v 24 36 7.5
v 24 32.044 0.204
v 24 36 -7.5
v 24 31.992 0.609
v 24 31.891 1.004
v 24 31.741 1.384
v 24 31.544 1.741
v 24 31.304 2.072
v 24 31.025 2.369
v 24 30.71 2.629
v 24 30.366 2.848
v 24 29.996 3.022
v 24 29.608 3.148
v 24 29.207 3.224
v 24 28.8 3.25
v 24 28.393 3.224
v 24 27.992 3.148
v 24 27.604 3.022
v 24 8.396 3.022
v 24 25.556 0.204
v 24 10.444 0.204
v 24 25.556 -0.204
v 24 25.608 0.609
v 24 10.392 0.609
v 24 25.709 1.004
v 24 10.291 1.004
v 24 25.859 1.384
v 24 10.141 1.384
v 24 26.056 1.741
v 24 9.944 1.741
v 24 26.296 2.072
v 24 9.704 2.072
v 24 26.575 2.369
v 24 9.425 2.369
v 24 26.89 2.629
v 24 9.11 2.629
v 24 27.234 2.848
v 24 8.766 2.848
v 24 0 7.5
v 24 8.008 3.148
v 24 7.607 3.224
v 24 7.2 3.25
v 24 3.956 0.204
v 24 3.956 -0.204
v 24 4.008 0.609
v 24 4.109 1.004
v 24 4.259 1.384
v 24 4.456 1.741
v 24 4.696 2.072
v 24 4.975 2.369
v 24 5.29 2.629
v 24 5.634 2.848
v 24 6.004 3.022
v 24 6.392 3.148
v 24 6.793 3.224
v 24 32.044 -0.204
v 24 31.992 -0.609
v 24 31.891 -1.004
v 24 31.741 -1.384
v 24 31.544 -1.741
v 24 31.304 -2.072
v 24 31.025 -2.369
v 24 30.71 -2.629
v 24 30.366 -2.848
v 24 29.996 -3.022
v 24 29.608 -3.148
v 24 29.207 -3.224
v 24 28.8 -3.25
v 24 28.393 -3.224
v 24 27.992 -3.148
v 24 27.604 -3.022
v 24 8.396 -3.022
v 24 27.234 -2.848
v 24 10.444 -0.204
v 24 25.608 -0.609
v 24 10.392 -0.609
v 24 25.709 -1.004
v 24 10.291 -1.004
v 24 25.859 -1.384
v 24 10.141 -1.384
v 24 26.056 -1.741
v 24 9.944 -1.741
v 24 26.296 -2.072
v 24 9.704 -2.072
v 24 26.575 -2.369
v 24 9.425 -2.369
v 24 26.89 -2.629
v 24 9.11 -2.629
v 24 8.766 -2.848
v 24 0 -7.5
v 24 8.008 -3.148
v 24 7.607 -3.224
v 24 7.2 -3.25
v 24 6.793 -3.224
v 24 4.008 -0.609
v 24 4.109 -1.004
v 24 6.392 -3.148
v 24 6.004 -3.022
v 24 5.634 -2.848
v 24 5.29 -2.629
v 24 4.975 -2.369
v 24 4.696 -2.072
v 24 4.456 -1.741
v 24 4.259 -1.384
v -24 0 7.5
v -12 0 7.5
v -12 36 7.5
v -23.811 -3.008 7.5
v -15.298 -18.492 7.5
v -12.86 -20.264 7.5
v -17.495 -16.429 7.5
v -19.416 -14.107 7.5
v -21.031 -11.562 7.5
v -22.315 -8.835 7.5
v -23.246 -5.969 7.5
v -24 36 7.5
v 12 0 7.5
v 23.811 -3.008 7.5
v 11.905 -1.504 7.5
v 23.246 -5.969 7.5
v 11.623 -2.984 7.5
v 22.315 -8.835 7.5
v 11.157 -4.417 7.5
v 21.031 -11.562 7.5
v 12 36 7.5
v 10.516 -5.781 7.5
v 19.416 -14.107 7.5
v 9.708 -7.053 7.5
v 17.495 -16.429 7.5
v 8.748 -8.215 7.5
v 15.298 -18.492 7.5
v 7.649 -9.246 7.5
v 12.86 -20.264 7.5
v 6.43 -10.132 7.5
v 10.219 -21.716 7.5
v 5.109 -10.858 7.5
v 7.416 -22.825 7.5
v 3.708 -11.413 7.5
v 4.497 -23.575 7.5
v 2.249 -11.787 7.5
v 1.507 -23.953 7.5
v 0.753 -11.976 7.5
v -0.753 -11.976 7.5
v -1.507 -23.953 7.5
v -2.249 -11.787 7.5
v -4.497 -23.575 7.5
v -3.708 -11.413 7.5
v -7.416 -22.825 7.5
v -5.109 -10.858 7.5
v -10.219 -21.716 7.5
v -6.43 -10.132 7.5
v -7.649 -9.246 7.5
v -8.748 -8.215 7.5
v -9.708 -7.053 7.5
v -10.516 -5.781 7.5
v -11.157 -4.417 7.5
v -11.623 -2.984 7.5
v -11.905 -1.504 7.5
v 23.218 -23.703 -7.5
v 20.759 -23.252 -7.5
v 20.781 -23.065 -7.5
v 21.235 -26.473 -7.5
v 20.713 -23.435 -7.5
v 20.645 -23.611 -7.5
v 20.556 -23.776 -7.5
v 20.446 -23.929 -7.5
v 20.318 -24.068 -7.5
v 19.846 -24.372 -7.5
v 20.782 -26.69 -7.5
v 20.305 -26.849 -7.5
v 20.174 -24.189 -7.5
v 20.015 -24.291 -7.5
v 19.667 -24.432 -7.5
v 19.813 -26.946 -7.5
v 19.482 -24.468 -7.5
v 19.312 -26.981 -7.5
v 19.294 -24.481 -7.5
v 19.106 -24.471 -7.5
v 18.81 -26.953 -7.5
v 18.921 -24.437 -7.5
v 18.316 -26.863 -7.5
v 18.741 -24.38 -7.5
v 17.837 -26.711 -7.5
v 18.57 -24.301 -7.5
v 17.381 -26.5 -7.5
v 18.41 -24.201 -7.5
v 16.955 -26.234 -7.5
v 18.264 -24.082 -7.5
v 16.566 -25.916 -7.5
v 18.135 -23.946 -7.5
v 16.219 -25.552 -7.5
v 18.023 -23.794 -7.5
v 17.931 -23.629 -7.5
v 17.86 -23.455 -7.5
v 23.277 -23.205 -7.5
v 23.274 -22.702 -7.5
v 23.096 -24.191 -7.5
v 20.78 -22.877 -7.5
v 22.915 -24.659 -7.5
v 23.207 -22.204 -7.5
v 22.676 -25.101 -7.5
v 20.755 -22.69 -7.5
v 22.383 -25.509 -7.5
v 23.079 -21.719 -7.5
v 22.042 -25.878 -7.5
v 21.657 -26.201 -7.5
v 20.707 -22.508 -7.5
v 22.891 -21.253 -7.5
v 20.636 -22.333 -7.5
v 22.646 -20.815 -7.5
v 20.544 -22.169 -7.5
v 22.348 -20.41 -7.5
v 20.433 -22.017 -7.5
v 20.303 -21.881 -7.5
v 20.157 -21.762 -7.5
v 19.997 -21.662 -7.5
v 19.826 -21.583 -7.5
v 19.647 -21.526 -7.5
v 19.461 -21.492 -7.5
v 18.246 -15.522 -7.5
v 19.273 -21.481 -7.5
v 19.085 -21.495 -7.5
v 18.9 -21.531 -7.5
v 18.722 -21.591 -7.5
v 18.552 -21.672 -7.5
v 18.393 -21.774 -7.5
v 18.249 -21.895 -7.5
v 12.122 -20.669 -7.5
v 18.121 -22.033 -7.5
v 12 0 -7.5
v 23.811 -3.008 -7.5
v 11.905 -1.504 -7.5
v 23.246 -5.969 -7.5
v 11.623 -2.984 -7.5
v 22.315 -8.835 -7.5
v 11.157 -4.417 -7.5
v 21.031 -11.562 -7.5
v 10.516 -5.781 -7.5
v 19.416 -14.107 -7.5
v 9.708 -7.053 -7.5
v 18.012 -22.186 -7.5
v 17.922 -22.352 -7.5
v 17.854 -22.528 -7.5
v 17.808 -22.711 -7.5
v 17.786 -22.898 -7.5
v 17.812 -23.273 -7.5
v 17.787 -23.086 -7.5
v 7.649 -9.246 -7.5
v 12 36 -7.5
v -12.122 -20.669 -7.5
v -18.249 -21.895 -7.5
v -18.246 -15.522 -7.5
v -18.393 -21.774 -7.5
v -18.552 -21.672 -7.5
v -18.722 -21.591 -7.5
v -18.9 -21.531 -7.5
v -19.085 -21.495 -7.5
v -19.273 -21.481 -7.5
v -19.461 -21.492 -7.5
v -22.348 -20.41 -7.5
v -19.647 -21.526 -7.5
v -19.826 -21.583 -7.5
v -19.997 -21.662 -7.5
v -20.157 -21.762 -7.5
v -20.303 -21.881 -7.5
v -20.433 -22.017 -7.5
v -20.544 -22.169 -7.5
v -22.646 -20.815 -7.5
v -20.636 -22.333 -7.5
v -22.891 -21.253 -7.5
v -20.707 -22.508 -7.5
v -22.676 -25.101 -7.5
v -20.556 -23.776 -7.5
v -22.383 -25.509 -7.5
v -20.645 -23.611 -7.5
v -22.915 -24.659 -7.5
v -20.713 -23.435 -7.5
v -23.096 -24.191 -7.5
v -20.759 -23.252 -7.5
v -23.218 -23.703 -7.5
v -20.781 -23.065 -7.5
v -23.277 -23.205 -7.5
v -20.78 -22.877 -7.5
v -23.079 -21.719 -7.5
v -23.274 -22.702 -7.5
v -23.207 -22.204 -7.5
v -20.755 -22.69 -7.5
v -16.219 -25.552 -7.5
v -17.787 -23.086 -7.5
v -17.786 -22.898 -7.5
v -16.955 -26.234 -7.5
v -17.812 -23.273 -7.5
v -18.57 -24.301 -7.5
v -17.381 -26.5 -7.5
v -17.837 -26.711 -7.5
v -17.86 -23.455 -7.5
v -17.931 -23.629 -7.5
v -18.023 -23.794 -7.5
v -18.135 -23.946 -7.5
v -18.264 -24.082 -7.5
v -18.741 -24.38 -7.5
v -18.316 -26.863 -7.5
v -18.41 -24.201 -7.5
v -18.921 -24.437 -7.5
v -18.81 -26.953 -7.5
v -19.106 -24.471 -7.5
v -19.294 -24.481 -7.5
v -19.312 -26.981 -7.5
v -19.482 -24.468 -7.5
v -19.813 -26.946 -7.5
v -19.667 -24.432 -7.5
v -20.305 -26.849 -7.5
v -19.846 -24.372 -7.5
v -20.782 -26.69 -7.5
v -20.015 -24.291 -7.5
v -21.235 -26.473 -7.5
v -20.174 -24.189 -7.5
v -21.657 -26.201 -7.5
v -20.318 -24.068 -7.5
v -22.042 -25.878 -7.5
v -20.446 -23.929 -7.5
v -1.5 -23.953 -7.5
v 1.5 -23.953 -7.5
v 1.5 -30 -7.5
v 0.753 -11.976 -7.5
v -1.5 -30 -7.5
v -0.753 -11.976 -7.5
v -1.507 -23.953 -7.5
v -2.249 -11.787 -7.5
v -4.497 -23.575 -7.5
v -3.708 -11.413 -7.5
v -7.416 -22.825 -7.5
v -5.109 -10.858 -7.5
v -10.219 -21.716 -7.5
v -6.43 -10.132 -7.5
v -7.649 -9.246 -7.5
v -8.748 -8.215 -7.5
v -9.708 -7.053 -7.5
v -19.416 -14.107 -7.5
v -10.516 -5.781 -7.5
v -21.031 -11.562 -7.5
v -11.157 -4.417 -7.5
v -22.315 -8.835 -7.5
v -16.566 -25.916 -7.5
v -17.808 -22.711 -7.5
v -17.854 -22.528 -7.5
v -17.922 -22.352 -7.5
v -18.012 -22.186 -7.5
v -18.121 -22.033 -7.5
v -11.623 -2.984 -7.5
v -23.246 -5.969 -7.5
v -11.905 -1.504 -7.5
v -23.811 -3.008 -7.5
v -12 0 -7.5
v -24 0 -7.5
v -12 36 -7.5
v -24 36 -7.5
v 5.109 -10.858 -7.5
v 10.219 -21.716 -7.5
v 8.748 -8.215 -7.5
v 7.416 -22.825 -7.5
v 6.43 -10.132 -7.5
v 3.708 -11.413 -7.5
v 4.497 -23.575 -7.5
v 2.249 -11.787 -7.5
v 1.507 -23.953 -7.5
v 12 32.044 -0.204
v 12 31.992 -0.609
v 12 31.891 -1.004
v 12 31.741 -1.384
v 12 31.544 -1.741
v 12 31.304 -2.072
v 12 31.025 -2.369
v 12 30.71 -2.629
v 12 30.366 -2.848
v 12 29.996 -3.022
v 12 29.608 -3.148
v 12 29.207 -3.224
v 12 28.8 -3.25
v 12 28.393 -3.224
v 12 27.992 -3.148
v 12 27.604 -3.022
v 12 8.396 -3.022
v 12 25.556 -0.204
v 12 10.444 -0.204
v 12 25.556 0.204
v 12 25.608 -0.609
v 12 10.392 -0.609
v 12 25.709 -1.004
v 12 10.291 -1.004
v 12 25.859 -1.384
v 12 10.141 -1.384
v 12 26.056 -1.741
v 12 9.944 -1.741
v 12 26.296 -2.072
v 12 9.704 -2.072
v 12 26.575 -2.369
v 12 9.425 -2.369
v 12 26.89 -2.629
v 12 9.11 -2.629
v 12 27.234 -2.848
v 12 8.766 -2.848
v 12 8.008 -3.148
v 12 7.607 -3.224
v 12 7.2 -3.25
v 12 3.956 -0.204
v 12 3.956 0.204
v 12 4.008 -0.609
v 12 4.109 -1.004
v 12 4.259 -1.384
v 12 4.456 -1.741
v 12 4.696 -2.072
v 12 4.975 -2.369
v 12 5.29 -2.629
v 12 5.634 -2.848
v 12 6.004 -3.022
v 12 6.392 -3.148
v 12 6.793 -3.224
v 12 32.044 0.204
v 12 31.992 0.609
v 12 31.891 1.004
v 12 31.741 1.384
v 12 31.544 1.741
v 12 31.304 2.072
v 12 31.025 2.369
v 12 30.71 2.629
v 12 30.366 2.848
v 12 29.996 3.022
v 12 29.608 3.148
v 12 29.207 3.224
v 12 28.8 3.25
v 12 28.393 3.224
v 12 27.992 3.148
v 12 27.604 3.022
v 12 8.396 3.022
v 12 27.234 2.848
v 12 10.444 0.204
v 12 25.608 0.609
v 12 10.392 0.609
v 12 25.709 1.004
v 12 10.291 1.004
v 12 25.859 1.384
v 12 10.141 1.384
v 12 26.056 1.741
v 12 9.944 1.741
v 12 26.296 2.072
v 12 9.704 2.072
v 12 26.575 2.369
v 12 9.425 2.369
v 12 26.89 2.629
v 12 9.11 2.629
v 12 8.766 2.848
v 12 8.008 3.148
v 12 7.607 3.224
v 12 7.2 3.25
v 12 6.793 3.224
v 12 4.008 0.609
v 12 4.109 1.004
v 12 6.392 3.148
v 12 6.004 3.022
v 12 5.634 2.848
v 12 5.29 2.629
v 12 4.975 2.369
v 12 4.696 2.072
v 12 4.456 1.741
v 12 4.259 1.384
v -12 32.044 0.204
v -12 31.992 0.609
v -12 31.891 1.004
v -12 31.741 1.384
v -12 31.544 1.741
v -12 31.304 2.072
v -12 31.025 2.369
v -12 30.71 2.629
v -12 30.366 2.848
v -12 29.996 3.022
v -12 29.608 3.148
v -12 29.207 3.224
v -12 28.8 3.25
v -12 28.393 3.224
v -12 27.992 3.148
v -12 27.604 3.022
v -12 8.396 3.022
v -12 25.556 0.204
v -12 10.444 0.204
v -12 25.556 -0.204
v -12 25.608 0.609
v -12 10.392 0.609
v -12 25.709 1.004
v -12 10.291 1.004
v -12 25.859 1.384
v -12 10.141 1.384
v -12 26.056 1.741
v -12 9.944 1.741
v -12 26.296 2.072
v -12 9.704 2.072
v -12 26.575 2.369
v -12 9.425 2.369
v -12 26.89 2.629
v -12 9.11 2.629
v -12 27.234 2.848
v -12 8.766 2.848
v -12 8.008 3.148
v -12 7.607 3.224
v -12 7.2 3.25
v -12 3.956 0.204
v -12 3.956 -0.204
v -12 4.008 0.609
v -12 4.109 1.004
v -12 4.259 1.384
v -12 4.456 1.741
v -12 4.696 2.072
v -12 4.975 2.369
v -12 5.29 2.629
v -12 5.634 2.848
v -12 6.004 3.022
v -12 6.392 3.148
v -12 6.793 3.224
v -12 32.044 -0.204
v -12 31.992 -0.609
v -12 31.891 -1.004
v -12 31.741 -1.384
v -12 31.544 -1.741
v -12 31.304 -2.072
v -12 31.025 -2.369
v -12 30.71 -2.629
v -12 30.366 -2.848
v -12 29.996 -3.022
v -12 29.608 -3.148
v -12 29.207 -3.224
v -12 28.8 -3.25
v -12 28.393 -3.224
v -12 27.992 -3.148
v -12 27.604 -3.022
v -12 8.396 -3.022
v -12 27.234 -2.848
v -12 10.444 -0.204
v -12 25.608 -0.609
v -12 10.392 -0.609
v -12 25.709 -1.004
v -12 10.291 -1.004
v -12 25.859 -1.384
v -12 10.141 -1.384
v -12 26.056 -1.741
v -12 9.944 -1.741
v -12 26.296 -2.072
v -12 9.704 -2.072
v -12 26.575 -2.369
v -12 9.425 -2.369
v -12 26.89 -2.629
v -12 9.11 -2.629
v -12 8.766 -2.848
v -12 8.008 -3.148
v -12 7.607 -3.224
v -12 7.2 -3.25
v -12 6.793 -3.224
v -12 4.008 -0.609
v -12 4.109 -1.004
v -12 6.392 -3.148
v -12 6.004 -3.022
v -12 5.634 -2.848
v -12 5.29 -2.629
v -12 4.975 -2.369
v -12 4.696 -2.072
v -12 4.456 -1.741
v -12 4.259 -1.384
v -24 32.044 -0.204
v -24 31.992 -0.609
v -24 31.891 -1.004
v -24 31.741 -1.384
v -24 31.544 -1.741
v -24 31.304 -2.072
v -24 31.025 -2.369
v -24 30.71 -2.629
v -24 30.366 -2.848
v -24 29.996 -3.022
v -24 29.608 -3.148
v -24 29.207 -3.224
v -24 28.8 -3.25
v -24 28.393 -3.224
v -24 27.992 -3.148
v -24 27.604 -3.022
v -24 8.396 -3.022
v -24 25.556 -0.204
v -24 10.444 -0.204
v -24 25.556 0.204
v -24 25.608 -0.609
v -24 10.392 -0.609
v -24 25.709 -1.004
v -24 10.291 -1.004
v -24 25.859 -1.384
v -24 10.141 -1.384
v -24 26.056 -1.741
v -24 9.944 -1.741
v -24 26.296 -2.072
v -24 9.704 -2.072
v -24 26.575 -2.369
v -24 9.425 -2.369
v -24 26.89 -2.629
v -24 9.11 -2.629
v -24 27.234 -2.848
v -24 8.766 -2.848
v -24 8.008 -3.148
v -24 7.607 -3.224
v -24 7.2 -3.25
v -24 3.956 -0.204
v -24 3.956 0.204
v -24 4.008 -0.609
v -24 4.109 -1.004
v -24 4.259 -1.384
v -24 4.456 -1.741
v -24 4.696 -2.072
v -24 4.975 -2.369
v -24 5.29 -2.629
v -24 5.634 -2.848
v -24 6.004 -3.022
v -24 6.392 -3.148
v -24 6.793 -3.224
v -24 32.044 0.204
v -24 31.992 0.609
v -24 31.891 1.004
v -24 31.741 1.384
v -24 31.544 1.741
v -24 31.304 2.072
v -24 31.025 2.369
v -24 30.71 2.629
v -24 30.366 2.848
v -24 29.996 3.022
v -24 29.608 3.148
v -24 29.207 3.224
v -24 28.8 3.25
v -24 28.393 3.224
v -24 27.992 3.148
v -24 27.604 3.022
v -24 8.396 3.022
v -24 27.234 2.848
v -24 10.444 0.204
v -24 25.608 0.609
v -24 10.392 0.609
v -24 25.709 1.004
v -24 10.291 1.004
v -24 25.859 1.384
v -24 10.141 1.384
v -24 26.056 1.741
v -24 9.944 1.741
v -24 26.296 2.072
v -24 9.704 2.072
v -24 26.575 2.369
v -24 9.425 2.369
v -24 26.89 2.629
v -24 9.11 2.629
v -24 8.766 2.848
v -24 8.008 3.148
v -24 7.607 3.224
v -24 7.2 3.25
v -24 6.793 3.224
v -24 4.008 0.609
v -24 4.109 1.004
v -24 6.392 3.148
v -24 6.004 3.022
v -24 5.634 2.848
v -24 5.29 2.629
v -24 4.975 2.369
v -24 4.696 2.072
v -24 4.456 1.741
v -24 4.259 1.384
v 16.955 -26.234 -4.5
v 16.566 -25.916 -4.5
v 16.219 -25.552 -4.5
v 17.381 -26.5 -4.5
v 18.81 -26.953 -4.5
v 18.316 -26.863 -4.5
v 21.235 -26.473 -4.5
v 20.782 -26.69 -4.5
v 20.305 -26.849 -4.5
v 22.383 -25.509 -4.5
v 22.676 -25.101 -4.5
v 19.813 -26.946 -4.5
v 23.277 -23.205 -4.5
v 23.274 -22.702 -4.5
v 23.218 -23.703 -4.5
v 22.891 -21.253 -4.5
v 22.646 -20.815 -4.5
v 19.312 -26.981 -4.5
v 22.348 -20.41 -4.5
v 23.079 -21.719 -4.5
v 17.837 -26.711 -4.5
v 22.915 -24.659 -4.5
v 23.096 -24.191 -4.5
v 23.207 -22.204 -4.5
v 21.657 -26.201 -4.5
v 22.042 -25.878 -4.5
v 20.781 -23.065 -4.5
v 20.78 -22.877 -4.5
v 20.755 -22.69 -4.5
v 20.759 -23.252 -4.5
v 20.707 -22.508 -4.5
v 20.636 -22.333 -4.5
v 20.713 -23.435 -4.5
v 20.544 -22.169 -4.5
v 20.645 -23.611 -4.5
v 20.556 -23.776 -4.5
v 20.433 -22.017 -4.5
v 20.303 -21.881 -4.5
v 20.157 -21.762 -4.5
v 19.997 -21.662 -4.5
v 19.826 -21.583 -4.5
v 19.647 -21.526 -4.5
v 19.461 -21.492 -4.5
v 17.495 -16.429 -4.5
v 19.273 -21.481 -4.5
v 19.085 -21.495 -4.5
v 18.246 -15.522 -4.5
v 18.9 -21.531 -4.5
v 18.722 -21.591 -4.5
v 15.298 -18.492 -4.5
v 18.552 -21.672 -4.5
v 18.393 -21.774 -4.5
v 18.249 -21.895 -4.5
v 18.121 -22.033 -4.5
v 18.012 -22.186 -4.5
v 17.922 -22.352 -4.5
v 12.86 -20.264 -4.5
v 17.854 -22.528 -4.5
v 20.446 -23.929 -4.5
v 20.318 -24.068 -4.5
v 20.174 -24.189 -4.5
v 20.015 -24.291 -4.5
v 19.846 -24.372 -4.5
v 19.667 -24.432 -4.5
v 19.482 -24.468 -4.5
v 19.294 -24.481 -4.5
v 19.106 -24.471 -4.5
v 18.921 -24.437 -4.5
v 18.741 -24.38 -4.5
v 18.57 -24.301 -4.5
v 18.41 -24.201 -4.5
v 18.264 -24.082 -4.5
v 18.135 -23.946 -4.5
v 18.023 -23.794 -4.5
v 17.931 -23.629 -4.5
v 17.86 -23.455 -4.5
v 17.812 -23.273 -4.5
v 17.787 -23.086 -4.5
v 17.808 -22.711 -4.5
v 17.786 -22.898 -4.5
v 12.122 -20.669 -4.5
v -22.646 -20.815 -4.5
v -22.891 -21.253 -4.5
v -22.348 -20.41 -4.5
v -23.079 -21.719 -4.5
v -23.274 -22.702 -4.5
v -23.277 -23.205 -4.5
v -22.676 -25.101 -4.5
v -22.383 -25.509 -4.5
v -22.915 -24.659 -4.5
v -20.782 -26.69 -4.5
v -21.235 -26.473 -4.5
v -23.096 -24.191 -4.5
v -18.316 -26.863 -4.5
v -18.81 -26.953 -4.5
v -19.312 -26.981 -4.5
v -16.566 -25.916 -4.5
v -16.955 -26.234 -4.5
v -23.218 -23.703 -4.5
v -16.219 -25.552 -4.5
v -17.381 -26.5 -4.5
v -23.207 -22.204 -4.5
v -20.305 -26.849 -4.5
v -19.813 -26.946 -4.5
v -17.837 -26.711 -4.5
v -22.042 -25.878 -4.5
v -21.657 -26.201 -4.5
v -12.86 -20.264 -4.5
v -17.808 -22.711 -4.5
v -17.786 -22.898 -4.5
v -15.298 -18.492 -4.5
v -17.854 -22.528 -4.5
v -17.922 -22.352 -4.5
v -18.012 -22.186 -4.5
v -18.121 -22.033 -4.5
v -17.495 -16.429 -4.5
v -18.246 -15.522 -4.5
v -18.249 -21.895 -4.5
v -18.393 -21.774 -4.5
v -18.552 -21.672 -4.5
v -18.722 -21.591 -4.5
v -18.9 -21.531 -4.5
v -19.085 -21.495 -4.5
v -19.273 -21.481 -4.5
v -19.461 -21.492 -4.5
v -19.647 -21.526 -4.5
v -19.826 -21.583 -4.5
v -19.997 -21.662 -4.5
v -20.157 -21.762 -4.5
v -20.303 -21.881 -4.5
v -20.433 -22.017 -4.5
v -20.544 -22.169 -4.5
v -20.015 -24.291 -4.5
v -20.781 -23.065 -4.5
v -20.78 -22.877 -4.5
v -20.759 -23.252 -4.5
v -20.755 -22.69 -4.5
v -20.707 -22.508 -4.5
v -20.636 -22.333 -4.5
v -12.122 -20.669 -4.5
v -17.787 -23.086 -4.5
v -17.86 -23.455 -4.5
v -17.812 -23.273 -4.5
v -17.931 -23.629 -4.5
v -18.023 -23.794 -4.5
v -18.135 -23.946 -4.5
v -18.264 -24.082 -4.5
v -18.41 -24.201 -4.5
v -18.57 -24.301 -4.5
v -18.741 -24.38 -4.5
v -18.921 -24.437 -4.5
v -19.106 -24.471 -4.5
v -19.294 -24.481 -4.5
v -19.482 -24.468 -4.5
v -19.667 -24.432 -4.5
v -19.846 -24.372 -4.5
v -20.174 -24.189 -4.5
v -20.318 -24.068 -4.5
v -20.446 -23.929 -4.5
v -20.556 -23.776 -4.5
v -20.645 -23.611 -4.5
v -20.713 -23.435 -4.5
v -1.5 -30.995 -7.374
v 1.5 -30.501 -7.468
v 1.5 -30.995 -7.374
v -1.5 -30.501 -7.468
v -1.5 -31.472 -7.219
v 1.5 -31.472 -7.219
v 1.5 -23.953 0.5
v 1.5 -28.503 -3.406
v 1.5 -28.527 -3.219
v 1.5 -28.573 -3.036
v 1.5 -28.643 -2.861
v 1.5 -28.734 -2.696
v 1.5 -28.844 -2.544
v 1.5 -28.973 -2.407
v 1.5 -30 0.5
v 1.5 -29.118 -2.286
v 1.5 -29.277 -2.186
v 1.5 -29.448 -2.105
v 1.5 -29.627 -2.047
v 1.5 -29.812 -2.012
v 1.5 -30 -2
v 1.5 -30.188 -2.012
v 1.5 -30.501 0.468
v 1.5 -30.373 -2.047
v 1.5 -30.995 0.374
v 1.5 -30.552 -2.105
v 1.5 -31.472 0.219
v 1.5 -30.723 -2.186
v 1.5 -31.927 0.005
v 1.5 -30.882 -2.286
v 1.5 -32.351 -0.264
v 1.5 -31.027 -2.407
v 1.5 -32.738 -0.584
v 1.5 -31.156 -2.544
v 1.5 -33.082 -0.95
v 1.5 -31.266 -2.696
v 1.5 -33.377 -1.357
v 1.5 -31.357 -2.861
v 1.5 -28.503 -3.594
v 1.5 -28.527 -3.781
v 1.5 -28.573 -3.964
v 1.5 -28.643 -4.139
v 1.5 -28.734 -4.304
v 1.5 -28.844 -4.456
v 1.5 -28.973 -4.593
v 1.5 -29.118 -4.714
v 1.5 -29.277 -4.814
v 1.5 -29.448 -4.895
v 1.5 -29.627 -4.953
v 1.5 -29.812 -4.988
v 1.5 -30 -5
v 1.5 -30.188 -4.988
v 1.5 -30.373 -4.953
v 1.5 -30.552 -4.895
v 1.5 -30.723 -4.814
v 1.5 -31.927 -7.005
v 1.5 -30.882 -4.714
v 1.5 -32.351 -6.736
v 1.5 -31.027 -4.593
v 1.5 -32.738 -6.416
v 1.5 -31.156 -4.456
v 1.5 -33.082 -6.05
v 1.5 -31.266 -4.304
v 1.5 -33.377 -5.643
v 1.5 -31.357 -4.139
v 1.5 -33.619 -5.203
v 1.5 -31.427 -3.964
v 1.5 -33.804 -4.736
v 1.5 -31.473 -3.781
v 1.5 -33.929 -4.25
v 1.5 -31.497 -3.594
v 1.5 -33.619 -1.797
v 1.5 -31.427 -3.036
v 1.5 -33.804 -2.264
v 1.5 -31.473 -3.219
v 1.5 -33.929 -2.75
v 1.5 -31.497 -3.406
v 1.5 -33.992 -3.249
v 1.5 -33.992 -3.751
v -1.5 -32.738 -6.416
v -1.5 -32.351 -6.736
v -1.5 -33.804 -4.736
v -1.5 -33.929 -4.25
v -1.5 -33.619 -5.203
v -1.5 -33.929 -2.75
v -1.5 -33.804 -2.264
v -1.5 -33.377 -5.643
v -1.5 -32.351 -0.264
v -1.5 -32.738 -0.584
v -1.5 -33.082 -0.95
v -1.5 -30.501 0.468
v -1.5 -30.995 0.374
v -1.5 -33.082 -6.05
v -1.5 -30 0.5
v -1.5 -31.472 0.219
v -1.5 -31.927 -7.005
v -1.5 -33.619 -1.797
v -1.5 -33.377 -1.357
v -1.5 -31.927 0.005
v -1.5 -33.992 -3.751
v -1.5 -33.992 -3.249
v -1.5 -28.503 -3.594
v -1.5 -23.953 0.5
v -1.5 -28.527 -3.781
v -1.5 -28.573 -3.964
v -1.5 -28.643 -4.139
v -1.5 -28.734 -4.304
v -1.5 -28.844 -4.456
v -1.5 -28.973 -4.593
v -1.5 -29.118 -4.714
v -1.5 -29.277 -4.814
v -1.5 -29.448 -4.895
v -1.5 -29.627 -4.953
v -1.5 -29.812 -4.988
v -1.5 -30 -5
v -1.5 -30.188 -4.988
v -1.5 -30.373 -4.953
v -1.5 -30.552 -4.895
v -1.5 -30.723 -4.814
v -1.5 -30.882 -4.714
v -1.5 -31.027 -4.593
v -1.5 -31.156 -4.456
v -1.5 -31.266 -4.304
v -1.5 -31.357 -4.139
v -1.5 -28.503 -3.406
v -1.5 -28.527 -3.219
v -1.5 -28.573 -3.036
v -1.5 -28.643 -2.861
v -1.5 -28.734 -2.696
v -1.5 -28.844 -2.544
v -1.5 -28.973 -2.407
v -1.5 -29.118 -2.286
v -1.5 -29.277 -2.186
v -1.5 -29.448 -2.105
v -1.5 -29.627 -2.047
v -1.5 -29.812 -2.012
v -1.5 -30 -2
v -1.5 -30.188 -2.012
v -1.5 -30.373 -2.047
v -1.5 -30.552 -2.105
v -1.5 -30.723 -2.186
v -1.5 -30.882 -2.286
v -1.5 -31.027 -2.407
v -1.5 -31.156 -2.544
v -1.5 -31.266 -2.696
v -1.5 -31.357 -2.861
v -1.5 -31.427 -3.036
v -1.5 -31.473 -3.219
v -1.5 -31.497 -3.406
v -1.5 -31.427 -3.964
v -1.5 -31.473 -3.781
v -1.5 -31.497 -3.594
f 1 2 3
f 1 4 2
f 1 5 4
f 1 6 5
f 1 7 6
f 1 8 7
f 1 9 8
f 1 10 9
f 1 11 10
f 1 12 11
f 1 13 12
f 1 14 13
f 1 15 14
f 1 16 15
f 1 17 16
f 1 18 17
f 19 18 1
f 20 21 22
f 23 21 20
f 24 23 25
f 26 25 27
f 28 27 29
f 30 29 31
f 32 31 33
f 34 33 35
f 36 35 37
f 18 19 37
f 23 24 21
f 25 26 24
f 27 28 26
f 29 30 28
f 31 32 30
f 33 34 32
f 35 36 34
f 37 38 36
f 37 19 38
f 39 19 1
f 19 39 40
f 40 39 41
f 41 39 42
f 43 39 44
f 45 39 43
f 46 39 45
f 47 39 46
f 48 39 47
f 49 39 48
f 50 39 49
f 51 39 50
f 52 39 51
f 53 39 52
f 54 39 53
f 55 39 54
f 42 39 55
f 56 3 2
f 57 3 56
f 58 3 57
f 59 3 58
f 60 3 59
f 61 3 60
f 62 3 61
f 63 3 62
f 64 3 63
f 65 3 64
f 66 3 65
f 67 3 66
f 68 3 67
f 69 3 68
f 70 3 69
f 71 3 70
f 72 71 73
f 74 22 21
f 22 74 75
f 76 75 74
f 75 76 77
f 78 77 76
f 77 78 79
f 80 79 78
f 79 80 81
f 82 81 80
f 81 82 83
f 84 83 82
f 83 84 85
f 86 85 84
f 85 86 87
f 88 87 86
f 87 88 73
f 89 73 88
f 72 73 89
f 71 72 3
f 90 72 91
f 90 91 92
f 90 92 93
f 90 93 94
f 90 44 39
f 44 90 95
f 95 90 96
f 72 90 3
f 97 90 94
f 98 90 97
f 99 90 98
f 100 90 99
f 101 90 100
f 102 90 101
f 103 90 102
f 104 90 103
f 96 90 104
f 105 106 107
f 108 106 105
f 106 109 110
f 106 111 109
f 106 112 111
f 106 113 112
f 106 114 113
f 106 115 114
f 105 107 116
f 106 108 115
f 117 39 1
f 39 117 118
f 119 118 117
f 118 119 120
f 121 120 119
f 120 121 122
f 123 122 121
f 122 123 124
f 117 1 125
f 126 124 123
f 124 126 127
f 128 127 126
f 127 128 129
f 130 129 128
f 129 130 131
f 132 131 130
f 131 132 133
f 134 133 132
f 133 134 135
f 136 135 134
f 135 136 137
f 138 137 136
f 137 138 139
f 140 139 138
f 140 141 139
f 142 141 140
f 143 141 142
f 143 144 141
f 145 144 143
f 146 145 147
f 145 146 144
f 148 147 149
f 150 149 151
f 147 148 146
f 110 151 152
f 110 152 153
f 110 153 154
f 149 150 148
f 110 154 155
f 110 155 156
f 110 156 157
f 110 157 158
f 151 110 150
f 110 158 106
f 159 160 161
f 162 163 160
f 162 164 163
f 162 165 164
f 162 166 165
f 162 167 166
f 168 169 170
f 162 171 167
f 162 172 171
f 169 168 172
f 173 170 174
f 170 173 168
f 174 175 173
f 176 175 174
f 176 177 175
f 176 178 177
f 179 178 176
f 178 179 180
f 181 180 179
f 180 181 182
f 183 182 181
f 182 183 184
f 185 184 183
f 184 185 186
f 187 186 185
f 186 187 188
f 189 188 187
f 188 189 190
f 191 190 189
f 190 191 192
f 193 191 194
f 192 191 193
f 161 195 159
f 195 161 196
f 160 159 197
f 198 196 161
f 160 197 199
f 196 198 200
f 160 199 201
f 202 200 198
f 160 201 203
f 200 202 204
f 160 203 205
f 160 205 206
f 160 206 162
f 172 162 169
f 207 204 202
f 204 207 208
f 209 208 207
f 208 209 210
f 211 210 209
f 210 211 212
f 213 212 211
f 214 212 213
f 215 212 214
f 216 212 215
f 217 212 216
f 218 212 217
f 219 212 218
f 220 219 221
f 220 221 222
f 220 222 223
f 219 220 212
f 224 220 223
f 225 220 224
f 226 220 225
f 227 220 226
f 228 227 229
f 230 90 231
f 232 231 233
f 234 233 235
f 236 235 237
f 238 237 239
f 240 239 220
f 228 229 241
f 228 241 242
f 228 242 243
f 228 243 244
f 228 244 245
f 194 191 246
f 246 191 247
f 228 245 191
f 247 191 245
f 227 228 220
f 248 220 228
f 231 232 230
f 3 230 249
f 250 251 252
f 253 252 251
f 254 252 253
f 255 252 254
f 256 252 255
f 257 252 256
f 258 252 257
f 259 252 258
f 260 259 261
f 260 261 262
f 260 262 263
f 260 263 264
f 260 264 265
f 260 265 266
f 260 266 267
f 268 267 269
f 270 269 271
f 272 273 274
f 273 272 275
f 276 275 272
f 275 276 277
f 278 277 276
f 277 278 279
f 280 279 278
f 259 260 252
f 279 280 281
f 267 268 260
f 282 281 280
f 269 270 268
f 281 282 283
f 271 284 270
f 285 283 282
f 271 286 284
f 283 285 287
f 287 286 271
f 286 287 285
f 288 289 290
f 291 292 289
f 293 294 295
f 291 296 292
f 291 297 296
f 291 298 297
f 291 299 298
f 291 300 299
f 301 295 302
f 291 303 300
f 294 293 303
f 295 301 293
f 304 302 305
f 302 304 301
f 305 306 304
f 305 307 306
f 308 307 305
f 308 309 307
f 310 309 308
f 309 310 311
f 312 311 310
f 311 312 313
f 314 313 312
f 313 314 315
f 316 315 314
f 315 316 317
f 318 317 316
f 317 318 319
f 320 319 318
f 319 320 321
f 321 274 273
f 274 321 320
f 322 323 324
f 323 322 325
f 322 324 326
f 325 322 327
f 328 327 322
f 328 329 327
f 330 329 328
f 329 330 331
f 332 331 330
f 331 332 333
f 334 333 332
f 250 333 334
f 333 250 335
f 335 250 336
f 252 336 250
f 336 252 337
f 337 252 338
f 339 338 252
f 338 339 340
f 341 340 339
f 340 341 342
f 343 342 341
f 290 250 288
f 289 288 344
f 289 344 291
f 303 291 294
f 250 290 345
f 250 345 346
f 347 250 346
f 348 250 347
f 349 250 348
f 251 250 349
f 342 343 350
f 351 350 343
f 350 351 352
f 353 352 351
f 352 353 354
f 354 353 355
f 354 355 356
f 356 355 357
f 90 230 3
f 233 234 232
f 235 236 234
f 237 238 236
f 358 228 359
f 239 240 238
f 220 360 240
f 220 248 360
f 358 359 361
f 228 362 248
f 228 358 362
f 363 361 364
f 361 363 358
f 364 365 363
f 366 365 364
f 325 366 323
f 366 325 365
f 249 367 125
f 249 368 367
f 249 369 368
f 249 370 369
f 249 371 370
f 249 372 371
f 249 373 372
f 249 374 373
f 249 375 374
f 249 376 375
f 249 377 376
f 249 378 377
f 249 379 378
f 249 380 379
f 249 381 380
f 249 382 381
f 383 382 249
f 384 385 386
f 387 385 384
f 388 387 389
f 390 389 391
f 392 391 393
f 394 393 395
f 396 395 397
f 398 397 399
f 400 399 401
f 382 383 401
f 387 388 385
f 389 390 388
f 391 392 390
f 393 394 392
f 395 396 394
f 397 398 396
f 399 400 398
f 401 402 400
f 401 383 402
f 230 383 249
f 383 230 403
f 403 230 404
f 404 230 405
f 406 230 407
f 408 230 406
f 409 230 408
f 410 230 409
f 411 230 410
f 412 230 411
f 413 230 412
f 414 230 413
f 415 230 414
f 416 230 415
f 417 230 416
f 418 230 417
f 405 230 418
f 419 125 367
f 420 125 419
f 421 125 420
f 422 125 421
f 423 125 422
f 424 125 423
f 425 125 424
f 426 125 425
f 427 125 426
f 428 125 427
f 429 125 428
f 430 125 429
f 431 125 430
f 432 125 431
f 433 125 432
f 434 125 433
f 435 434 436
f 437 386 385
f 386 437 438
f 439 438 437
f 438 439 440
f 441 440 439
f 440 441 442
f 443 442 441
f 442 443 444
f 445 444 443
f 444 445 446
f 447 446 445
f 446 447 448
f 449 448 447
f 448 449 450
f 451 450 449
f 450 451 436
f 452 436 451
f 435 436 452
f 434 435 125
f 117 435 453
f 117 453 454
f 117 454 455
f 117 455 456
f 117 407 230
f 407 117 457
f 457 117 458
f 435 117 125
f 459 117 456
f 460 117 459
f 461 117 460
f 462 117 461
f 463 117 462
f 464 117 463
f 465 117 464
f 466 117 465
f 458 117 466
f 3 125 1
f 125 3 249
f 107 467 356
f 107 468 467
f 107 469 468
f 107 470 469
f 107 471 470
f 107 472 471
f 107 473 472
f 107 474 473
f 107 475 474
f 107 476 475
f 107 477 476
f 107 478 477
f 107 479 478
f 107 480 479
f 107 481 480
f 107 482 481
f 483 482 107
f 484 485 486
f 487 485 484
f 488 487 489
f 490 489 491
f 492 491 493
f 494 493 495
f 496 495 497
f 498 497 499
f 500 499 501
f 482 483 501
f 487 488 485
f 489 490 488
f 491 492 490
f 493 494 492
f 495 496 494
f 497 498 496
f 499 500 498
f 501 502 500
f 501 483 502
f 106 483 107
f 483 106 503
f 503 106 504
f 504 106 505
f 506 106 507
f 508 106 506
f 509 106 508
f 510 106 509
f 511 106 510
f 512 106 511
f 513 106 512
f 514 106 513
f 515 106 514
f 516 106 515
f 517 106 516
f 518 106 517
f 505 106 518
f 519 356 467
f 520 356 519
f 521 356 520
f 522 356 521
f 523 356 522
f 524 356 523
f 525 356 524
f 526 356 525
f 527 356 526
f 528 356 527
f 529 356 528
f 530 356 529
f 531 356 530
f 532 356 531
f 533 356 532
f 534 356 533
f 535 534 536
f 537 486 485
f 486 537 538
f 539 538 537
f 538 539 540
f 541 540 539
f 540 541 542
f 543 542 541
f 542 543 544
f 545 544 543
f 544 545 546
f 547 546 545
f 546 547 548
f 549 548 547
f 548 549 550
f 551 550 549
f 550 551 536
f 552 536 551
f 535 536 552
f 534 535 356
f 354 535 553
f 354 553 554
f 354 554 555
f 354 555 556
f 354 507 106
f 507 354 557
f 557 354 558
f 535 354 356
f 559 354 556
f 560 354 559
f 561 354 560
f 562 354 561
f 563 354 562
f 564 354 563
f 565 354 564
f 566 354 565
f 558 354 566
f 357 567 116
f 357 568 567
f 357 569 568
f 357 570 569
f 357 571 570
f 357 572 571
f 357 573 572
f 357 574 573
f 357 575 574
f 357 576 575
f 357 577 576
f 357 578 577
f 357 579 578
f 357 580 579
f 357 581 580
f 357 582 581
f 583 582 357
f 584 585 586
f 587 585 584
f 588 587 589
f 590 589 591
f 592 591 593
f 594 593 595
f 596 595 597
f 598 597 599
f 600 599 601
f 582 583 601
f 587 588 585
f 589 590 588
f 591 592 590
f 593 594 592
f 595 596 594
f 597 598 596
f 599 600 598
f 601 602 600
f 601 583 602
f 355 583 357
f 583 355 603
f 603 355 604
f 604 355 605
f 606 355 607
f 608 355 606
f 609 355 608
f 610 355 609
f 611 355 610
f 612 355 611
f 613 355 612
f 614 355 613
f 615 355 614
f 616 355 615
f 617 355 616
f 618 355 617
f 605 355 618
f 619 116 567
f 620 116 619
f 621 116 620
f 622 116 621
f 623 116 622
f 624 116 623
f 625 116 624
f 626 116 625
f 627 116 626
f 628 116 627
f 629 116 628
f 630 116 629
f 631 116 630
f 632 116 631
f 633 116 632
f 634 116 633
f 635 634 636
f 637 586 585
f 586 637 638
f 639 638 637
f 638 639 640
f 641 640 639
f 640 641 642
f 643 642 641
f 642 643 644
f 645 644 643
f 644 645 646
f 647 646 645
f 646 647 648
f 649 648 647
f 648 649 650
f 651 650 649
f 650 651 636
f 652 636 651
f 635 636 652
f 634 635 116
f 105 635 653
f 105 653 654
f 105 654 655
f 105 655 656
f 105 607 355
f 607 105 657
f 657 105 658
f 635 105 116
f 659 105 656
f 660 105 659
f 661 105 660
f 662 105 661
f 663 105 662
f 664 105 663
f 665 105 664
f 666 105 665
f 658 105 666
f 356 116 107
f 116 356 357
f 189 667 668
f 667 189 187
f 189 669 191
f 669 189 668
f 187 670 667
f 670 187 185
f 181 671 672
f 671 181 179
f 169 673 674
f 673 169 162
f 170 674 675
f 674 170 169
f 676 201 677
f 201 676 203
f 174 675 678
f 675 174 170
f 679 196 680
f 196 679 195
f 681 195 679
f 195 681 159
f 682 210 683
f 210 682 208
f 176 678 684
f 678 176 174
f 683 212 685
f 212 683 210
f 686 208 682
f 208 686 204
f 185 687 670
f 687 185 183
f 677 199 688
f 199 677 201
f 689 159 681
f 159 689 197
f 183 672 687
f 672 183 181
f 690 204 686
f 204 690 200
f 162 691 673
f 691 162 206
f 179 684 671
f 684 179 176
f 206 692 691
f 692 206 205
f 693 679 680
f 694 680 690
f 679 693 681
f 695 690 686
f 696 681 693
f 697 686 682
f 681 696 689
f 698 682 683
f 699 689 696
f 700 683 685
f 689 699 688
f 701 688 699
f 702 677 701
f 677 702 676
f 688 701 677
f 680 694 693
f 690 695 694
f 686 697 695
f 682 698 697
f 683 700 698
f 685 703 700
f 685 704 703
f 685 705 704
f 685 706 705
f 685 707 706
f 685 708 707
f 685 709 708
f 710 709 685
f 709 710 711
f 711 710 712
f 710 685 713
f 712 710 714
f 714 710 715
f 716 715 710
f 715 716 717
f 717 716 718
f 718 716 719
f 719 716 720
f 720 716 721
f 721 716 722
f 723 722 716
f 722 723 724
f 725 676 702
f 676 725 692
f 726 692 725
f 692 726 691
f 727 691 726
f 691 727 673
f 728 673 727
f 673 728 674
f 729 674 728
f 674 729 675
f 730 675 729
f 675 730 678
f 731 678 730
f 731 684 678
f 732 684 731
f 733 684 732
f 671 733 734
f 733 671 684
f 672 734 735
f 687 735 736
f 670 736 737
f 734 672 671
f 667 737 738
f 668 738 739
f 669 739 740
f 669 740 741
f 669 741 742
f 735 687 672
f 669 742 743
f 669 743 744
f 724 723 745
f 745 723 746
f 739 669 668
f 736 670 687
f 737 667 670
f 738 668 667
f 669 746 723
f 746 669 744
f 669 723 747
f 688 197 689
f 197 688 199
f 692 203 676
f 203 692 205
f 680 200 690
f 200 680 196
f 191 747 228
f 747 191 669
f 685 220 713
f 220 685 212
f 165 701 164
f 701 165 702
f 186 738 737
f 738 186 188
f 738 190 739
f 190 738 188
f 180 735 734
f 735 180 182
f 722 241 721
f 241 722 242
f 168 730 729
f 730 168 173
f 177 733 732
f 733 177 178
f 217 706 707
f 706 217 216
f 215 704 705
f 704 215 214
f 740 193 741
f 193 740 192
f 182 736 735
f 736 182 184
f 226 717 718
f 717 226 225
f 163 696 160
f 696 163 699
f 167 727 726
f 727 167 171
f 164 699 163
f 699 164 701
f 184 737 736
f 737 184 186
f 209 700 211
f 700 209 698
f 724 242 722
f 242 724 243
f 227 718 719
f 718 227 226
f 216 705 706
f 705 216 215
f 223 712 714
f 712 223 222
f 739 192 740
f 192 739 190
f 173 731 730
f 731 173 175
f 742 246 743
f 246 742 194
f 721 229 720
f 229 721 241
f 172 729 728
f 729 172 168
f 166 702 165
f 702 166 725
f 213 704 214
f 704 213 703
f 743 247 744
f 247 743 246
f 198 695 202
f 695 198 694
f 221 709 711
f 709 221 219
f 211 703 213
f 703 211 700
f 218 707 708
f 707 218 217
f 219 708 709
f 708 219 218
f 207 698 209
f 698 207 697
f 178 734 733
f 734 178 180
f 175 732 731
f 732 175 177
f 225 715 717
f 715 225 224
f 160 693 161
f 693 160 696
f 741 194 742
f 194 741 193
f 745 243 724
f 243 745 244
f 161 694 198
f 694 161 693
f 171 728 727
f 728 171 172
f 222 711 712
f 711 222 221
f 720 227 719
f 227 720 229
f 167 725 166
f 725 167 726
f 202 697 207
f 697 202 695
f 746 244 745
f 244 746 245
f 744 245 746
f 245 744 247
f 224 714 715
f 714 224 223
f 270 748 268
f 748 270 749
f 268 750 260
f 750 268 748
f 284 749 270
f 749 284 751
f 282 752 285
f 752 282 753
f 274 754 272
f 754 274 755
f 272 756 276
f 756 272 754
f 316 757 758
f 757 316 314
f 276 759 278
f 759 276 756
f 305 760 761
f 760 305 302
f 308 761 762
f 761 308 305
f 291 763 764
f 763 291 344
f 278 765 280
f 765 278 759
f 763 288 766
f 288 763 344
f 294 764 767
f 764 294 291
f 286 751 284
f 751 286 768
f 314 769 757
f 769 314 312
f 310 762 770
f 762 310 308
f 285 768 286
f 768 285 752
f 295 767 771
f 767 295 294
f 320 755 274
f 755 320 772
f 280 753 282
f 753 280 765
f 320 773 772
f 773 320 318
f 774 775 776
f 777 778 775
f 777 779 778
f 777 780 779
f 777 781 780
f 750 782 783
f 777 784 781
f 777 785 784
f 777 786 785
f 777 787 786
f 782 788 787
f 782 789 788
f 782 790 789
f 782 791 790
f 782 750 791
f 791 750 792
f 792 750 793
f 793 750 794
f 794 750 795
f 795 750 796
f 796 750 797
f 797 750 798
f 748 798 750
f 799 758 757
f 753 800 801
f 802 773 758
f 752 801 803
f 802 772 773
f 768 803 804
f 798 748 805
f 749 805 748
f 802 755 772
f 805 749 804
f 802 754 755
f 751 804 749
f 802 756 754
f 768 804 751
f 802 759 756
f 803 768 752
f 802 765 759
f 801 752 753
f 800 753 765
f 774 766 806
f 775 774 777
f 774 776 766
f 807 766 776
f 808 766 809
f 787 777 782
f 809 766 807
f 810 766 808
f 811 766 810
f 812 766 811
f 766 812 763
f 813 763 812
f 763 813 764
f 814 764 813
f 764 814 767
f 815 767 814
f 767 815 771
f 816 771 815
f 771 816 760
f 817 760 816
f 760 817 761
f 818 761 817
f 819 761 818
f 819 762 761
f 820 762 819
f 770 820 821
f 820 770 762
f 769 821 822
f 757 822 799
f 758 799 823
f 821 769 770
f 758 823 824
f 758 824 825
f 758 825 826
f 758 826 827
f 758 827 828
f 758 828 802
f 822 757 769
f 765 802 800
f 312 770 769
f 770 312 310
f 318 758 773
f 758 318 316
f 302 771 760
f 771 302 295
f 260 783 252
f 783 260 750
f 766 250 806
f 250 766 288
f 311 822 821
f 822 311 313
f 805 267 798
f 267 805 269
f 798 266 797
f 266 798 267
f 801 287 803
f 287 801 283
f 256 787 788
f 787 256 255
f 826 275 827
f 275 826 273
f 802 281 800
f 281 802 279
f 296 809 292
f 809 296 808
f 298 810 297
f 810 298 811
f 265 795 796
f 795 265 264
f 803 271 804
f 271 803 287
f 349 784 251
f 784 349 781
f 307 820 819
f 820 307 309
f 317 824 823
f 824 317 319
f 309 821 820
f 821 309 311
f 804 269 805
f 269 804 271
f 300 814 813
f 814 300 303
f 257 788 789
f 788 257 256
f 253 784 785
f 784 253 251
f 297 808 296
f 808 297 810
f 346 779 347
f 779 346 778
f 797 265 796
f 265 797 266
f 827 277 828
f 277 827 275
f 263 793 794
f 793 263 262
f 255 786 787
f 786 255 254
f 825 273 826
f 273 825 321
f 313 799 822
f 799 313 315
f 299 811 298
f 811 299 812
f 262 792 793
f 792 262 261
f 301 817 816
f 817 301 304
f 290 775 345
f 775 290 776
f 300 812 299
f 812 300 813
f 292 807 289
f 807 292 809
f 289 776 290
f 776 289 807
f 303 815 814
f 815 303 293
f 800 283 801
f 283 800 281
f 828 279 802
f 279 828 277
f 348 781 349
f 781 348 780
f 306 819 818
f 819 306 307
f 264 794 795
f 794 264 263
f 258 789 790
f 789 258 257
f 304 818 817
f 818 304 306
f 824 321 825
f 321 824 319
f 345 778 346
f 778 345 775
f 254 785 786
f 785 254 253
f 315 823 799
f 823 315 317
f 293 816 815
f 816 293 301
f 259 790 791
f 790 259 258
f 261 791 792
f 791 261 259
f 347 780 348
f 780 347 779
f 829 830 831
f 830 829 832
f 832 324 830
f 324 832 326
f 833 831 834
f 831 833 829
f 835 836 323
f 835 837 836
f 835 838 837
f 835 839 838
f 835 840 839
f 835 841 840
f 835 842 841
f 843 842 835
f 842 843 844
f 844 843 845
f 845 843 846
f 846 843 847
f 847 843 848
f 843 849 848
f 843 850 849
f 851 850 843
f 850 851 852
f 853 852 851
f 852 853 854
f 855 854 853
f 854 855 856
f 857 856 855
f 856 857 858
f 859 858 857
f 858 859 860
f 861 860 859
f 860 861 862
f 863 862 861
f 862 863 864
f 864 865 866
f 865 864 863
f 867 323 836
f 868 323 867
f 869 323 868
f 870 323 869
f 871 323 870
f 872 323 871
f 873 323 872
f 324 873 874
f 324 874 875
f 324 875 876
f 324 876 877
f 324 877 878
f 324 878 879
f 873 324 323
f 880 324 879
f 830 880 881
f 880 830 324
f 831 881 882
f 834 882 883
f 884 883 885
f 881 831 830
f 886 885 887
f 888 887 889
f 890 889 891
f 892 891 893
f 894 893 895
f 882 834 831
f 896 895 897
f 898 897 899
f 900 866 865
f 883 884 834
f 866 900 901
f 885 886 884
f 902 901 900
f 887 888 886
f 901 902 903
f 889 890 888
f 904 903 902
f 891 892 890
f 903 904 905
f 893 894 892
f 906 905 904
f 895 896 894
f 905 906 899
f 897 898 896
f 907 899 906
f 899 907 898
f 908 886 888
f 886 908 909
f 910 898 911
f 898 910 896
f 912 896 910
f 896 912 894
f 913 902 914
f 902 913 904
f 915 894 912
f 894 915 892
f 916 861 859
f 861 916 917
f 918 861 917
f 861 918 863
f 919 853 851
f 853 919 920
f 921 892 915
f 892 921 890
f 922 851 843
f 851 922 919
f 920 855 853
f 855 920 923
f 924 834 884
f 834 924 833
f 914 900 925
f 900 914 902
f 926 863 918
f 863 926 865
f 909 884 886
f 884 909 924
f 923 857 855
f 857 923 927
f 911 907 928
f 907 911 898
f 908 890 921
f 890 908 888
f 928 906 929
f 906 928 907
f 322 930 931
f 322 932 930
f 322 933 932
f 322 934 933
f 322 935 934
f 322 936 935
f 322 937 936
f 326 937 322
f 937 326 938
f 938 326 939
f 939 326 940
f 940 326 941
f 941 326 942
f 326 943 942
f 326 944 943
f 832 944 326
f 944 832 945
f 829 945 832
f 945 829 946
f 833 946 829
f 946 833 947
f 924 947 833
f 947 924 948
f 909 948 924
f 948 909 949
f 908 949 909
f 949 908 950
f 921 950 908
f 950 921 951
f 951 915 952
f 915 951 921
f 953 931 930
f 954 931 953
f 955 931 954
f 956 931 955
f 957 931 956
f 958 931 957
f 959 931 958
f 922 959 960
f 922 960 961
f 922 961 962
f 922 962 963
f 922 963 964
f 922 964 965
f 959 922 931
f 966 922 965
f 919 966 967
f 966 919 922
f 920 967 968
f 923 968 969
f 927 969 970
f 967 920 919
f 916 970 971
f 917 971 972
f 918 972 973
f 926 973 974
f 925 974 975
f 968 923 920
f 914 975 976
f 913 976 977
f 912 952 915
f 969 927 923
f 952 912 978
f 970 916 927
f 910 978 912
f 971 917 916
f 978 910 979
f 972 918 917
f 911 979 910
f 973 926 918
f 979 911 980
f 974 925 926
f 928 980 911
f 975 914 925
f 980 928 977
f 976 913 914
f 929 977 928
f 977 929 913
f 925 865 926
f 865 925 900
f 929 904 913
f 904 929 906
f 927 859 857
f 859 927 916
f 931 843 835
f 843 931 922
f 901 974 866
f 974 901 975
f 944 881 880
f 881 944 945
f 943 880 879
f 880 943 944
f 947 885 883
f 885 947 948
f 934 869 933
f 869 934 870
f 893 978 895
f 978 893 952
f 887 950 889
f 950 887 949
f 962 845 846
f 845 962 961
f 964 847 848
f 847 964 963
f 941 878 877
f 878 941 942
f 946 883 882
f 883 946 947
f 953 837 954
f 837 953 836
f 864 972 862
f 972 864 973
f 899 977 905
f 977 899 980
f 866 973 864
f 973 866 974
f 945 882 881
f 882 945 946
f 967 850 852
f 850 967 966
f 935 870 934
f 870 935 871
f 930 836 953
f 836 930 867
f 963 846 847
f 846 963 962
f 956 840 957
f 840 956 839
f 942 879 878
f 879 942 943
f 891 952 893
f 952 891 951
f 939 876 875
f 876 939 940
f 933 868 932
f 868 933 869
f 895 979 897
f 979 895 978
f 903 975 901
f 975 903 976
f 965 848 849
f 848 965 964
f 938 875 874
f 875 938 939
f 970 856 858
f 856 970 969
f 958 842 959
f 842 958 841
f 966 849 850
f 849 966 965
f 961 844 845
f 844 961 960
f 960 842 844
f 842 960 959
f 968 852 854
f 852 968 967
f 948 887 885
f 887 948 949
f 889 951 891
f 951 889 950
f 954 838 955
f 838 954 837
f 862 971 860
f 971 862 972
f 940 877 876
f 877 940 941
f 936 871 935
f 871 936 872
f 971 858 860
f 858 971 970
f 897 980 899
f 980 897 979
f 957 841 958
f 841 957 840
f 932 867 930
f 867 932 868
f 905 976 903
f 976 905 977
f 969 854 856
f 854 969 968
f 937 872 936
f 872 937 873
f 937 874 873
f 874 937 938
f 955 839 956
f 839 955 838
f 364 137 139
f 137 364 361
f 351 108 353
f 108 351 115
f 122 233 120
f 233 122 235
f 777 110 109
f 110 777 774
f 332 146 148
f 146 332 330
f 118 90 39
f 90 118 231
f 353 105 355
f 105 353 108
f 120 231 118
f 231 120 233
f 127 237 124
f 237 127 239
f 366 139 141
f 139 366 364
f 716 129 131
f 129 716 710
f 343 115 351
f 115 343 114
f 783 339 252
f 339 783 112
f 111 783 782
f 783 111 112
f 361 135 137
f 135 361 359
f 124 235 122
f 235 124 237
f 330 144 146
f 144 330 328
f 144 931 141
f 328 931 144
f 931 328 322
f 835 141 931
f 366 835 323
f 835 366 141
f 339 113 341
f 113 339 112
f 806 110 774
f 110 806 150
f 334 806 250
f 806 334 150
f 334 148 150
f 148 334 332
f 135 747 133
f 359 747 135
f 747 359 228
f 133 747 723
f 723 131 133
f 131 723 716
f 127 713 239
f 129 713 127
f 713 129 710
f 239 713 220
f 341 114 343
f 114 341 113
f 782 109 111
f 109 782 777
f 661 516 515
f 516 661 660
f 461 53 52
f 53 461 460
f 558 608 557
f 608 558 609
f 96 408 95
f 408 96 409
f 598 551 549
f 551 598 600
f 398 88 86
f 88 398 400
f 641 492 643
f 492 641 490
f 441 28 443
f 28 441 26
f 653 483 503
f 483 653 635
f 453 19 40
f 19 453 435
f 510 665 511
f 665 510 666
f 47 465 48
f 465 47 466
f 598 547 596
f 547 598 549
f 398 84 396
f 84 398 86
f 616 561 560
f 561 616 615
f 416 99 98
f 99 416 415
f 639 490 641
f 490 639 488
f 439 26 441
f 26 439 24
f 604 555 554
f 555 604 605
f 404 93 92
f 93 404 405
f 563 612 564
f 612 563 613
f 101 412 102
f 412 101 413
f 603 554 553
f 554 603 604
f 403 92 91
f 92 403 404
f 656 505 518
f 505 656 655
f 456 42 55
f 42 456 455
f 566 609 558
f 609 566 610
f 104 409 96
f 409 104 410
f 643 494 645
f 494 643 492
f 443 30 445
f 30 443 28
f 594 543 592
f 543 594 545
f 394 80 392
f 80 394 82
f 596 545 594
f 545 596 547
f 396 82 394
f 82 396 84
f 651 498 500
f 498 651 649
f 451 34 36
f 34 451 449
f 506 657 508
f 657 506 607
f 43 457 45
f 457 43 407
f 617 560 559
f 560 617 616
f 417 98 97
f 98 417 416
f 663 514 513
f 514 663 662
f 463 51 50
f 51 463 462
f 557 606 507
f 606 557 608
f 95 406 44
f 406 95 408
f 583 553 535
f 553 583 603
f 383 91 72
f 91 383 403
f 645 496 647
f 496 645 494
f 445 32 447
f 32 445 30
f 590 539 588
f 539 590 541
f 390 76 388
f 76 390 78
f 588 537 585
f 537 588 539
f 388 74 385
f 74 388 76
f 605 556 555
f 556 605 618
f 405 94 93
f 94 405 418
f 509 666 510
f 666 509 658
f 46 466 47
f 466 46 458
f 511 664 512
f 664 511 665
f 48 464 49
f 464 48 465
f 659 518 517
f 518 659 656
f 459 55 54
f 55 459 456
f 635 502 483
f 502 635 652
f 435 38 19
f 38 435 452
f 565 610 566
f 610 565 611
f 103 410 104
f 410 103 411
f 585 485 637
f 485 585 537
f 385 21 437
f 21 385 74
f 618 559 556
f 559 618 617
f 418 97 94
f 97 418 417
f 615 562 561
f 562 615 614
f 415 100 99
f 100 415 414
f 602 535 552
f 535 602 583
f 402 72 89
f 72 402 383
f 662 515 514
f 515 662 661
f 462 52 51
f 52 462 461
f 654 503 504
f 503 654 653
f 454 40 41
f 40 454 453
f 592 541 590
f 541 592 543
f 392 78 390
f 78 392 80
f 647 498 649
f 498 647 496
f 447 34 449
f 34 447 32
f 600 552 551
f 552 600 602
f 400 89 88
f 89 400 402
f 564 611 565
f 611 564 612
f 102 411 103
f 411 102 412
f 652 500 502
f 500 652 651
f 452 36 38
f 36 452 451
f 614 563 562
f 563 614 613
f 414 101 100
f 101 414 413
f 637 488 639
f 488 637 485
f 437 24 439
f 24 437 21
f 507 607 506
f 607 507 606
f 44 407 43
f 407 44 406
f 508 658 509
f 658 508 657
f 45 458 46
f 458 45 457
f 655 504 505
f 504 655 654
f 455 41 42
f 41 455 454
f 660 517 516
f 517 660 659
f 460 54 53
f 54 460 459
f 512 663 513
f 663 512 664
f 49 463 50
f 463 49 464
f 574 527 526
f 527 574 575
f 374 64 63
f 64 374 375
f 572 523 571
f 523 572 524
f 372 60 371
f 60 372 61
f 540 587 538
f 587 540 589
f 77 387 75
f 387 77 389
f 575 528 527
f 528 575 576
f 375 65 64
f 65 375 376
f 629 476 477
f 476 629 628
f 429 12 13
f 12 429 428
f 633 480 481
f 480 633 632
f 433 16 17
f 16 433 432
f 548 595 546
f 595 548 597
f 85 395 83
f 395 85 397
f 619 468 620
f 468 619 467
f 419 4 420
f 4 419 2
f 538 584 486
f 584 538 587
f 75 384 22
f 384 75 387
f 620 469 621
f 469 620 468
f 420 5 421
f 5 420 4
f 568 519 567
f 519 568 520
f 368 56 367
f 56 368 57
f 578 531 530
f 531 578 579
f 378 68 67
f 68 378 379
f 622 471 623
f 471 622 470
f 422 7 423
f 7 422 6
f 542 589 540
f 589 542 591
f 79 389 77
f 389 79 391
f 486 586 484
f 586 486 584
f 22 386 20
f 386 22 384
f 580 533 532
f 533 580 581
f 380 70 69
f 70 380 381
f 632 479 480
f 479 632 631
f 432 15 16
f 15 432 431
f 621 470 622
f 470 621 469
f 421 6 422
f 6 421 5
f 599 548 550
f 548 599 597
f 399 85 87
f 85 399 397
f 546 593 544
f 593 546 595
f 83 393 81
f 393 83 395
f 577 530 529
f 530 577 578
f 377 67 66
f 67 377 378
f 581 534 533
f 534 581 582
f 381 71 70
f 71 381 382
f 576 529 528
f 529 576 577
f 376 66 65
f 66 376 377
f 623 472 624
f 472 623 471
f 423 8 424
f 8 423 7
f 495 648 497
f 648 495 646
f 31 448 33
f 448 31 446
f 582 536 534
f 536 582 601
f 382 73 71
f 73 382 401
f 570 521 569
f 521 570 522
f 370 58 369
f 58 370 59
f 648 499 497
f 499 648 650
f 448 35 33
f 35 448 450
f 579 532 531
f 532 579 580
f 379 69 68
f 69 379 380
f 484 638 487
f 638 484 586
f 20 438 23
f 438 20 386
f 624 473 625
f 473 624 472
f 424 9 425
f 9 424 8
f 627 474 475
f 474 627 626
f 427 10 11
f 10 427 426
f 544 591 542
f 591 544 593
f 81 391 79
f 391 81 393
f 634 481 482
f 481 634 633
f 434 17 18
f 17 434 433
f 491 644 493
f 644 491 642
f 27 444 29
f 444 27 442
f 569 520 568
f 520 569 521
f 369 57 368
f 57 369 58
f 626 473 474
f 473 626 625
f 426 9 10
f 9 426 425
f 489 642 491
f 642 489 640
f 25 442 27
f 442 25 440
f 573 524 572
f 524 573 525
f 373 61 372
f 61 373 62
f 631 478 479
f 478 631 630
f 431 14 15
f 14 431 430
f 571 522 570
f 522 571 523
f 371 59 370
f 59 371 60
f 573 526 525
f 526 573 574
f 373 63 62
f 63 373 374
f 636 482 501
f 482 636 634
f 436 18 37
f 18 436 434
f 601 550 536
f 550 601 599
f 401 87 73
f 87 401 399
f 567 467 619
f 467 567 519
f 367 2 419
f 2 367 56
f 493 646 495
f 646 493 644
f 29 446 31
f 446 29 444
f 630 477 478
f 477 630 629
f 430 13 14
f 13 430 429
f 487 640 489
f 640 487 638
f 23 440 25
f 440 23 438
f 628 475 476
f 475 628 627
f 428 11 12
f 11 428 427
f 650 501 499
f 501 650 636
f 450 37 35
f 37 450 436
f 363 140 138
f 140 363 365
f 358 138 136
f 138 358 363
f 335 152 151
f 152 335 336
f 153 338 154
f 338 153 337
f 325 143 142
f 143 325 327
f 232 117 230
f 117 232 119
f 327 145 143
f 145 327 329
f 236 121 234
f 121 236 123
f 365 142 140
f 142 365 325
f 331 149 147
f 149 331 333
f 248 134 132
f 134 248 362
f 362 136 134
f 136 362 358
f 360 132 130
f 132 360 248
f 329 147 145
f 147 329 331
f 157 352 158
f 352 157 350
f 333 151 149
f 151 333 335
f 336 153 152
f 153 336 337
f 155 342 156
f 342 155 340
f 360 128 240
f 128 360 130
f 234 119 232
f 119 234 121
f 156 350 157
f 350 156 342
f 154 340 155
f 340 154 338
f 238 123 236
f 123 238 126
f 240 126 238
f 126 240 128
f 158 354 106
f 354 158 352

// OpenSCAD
$fn = 50;
radius = 8/2;
h = 8;
ww = 3; //wall width

module rod_end_2(radius, h, ww, tube_r) {
difference() {
union() {
translate([0,-ww*2,0]) rotate([0,0,0]) cylinder(r = 3*ww/2, h = h, center = true);
translate([0,0,0]) cube([ww*3, ww*4, h], center = true);
translate([0,ww*2,0]) rotate([0,0,180]) cylinder(r = 3*ww/2, h = h, center = true);
}
rotate([90,0,0]) cylinder(r = tube_r, h = 100, center = true);
translate([0,2*ww,0]) rotate([0,0,180]) cylinder(r = 3/2, h = 100, center = true);
}
}

module rod_end(radius, h, ww, tube_r) {
difference() {
union() {
for(i=[1,-1])
translate([ww*i,0, 0]) rotate([90,-90,90]) connector(); 
translate([0,ww,0]) cube([ww*3, ww*2, h], center = true);
translate([0,ww*2,0]) rotate([0,0,180]) cylinder(r = 3*ww/2, h = h, center = true);
}
//translate([0,-ww,0]) rotate([90,0,180]) cylinder(r = tube_r, h = 100);
translate([0,2*ww,0]) rotate([0,0,180]) cylinder(r = 3/2, h = 100, center = true);
}
}

module connector() {
difference() {
union() {
translate([0,ww*2,0]) cylinder(r = h/2, h = ww, center = true);
translate([0,ww/2,0]) cube([h, ww*3, ww], center = true);
}
translate([0,ww*2,0]) cylinder(r = 3/2, h = ww+2, center = true);
}
}

module band(radius, h, ww) {
difference() {
union() {
cylinder(r = radius + ww, h = h, center = true); //outer band

for(i=[1,-1]) //connectors
translate([(radius)*i,ww,0]) rotate([90,i*90,0]) connector(radius, h, ww);
}
union() {
cylinder(r = radius, h = h + 2, center = true);
translate([0,ww/2-100,0]) cube([(radius + ww)*2, 200, h+1], center=true);
}
}
}

module clamp(radius, h, ww) {
translate([0,0,h/2]){
translate([0,radius+ww,0]) rotate([90,90,90]) connector(radius, h, ww);
band(radius, h, ww);
scale([1,-1,1]) band(radius, h, ww);
}
}

module demo() {
translate([0,radius+ww*3,h/2])
rotate([15,0,0])
translate([0,ww*2,0])
{
translate([0,ww*2,h]) rotate(160) translate([0, -ww*2, 0]) {
rod_end_2(radius, h, ww, 4.5/2);
#rotate([90,90,0]) cylinder(r = 4.5/2, h =50);
}
rod_end(radius, h, ww, 4.5/2);
}
clamp(radius, h, ww);
%cylinder(r = radius, h = 20);
}


module table_clamp(table_h, ww, depth) {
difference() {
	union() {
		cylinder(r = table_h, h = depth, center = true);
		for(i=[+1,-1,]) translate([table_h*0.75*i,table_h*1.5/2,0]) 
		cube([table_h/2, table_h*1.5, depth], center = true);
		for(i=[220, 140])
		rotate([0,0,i]) translate([0,table_h,-depth/2 + 3/2]) connector();
		translate([0,0,4 -depth/2]) rotate([0,90,180]) translate([0,table_h,0]) connector();
	}
	union() {
		cylinder(r = table_h/2, h = depth + 1, center = true);
		translate([0,table_h,0]) cube([table_h, table_h*2, depth+1], center = true);
		for(t = [0.3, 1.2])
		translate([0,t*table_h,0]) rotate([0,90,0]) cylinder(r = 6.5/2, h = 100, center = true); 

	}
}
}

table_clamp(24, 10, 15);

//demo();
//translate([0,0,h/2]) rod_end_2(radius, h, ww, 4.5/2);
